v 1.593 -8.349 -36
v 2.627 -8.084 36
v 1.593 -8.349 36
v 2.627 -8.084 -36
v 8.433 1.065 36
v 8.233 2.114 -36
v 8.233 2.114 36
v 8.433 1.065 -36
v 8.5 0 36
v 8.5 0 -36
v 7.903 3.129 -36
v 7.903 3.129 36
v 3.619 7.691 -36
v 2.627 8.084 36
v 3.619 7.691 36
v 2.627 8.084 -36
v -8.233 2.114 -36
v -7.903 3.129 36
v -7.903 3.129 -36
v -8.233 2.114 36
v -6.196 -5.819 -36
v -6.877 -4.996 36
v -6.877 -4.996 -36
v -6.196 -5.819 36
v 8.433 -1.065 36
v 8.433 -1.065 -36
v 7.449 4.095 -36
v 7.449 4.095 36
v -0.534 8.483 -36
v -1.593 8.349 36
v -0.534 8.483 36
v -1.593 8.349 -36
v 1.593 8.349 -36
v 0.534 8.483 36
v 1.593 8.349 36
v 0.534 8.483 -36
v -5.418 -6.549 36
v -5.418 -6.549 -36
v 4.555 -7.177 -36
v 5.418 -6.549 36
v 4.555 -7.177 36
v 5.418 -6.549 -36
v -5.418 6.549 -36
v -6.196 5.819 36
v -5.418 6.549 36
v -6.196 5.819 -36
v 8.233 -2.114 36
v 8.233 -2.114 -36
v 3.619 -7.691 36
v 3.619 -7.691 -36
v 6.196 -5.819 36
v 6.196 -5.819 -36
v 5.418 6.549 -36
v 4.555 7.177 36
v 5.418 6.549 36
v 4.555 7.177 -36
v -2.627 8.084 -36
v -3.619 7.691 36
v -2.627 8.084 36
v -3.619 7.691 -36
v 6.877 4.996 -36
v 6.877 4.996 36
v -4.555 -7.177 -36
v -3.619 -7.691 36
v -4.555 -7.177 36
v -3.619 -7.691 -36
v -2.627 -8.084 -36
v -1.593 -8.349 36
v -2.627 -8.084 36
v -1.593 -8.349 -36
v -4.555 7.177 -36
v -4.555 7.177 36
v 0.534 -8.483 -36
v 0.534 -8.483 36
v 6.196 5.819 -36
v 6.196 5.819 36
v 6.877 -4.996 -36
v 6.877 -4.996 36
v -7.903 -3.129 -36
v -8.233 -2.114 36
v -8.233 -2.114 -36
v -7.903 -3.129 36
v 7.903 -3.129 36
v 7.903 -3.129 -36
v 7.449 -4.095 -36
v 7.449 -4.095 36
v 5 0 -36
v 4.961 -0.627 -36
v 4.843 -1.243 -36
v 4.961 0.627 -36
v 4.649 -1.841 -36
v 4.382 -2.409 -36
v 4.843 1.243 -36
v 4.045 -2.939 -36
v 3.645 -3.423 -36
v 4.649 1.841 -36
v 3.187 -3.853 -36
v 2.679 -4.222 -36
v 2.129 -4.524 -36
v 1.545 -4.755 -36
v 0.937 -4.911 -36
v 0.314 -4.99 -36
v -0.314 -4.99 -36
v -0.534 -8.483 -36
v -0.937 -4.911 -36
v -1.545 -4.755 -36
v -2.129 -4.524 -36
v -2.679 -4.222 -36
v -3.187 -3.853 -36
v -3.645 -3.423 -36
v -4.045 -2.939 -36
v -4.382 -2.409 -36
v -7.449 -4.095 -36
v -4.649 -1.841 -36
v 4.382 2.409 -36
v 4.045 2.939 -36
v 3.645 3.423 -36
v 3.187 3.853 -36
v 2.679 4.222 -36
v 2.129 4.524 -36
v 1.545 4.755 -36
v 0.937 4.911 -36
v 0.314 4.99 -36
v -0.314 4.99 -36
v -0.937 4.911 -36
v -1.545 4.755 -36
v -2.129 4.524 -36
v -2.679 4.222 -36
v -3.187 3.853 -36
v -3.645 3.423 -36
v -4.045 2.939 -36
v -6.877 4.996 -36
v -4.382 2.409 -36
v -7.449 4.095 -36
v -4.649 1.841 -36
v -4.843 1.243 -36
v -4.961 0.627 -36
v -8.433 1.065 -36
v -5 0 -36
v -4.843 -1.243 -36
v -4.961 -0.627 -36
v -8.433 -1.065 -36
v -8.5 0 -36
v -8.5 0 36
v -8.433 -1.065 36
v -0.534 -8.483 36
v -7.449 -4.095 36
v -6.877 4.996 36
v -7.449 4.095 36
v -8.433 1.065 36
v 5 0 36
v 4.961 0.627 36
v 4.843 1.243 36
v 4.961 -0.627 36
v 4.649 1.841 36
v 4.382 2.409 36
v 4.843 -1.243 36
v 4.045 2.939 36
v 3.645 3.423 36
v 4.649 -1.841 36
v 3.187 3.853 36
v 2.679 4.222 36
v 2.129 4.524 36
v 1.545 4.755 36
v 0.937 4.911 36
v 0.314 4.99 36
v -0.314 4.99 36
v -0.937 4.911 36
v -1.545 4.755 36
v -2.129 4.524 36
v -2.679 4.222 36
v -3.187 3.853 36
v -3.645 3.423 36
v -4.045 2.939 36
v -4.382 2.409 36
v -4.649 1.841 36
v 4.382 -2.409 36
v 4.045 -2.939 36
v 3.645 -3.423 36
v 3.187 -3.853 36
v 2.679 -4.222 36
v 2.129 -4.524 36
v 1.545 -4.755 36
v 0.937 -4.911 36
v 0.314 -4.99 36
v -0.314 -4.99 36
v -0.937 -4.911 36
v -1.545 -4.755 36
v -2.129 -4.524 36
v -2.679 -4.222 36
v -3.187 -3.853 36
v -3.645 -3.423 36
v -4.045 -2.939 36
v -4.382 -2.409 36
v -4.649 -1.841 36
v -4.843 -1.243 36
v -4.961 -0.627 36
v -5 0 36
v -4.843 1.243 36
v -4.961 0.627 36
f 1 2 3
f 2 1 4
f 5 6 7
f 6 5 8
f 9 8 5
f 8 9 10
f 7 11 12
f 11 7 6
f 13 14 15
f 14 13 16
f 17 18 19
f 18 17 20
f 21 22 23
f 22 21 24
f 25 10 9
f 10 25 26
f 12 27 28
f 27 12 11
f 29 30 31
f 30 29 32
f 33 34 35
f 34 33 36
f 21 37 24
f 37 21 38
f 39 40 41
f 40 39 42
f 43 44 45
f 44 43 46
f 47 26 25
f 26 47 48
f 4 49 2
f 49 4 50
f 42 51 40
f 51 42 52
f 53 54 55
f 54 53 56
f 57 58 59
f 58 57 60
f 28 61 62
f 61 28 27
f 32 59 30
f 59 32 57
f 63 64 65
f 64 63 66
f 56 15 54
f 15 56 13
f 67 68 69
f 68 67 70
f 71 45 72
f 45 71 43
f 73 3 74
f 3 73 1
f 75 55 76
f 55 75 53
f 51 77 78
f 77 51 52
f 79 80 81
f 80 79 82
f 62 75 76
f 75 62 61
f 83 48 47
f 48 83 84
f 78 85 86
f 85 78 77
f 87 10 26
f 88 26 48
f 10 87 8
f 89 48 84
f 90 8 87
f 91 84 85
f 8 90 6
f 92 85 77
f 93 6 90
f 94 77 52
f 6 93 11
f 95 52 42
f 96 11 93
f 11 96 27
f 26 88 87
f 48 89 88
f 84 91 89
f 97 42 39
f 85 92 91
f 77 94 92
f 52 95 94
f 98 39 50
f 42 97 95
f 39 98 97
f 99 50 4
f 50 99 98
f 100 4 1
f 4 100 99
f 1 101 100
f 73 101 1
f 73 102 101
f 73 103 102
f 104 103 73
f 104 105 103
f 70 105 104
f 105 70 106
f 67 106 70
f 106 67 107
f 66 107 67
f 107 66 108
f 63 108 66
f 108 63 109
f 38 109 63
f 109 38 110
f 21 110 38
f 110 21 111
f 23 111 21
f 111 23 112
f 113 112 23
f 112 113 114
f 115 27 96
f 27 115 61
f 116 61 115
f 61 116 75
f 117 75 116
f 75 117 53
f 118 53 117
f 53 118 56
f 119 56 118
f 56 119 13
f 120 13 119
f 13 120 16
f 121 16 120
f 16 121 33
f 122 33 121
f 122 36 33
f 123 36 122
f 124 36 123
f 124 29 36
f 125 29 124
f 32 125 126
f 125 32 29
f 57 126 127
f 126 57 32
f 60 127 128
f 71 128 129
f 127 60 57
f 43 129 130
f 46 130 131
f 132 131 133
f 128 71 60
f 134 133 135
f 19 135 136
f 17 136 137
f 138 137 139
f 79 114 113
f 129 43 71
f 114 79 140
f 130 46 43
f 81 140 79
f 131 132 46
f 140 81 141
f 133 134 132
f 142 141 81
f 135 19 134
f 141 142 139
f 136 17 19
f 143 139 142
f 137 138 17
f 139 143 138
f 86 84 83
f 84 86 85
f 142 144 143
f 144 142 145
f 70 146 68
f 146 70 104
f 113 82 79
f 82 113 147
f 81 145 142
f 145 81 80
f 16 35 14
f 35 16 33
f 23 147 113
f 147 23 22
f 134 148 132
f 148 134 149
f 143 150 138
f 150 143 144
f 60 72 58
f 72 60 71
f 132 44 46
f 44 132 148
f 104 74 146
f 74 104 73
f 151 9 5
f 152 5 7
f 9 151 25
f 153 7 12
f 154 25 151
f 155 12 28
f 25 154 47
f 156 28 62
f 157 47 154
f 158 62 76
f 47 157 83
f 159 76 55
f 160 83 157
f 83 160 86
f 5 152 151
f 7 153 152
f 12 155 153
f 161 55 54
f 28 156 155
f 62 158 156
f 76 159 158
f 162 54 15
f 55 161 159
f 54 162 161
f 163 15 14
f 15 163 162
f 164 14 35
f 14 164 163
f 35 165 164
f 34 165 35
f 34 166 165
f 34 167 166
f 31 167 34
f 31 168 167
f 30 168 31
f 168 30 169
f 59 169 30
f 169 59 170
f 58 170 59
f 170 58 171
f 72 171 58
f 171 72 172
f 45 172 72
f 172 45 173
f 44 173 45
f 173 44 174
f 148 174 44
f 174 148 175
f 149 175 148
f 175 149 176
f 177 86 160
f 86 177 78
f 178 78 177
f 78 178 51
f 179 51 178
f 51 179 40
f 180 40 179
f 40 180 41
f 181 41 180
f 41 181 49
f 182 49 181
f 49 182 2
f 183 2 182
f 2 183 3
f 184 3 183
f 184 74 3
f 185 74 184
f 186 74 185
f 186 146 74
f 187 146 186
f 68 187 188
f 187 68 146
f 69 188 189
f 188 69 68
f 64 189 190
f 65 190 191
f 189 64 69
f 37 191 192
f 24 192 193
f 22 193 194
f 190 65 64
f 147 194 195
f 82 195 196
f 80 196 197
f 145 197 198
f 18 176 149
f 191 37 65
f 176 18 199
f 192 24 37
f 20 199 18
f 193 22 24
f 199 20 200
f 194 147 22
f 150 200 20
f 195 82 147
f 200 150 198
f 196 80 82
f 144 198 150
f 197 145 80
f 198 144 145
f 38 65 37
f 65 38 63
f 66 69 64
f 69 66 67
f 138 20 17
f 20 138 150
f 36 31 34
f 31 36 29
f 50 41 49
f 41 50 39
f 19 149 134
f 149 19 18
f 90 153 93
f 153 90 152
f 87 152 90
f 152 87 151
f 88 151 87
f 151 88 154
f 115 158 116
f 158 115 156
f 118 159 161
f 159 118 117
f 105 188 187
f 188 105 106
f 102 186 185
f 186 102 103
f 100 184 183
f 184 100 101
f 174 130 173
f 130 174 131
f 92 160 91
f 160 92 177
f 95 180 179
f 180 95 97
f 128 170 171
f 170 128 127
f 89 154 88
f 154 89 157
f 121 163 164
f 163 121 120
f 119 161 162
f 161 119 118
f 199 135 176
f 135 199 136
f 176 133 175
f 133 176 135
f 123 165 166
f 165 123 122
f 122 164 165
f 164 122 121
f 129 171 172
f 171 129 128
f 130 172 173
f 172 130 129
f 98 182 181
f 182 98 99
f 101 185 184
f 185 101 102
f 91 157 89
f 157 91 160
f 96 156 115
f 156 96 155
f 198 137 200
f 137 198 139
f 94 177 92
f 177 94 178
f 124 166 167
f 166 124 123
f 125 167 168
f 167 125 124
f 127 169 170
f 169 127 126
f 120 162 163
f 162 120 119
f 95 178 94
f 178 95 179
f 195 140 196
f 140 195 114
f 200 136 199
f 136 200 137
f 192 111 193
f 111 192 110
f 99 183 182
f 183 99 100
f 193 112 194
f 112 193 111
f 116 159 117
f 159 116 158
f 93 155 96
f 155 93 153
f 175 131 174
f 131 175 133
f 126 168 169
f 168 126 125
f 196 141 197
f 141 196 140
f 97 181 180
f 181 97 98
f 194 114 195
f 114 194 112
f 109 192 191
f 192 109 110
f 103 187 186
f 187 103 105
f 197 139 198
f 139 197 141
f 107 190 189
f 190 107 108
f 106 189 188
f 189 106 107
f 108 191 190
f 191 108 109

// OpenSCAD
$fn = 50;


difference() {
	union() {
		translate(v = [0, 0, -36.0000000000]) {
			cylinder(h = 72, r = 8.5000000000);
		}
	}
	union() {
		translate(v = [0, 0, -100.0000000000]) {
			cylinder(h = 200, r = 5.0000000000);
		}
	}
}
